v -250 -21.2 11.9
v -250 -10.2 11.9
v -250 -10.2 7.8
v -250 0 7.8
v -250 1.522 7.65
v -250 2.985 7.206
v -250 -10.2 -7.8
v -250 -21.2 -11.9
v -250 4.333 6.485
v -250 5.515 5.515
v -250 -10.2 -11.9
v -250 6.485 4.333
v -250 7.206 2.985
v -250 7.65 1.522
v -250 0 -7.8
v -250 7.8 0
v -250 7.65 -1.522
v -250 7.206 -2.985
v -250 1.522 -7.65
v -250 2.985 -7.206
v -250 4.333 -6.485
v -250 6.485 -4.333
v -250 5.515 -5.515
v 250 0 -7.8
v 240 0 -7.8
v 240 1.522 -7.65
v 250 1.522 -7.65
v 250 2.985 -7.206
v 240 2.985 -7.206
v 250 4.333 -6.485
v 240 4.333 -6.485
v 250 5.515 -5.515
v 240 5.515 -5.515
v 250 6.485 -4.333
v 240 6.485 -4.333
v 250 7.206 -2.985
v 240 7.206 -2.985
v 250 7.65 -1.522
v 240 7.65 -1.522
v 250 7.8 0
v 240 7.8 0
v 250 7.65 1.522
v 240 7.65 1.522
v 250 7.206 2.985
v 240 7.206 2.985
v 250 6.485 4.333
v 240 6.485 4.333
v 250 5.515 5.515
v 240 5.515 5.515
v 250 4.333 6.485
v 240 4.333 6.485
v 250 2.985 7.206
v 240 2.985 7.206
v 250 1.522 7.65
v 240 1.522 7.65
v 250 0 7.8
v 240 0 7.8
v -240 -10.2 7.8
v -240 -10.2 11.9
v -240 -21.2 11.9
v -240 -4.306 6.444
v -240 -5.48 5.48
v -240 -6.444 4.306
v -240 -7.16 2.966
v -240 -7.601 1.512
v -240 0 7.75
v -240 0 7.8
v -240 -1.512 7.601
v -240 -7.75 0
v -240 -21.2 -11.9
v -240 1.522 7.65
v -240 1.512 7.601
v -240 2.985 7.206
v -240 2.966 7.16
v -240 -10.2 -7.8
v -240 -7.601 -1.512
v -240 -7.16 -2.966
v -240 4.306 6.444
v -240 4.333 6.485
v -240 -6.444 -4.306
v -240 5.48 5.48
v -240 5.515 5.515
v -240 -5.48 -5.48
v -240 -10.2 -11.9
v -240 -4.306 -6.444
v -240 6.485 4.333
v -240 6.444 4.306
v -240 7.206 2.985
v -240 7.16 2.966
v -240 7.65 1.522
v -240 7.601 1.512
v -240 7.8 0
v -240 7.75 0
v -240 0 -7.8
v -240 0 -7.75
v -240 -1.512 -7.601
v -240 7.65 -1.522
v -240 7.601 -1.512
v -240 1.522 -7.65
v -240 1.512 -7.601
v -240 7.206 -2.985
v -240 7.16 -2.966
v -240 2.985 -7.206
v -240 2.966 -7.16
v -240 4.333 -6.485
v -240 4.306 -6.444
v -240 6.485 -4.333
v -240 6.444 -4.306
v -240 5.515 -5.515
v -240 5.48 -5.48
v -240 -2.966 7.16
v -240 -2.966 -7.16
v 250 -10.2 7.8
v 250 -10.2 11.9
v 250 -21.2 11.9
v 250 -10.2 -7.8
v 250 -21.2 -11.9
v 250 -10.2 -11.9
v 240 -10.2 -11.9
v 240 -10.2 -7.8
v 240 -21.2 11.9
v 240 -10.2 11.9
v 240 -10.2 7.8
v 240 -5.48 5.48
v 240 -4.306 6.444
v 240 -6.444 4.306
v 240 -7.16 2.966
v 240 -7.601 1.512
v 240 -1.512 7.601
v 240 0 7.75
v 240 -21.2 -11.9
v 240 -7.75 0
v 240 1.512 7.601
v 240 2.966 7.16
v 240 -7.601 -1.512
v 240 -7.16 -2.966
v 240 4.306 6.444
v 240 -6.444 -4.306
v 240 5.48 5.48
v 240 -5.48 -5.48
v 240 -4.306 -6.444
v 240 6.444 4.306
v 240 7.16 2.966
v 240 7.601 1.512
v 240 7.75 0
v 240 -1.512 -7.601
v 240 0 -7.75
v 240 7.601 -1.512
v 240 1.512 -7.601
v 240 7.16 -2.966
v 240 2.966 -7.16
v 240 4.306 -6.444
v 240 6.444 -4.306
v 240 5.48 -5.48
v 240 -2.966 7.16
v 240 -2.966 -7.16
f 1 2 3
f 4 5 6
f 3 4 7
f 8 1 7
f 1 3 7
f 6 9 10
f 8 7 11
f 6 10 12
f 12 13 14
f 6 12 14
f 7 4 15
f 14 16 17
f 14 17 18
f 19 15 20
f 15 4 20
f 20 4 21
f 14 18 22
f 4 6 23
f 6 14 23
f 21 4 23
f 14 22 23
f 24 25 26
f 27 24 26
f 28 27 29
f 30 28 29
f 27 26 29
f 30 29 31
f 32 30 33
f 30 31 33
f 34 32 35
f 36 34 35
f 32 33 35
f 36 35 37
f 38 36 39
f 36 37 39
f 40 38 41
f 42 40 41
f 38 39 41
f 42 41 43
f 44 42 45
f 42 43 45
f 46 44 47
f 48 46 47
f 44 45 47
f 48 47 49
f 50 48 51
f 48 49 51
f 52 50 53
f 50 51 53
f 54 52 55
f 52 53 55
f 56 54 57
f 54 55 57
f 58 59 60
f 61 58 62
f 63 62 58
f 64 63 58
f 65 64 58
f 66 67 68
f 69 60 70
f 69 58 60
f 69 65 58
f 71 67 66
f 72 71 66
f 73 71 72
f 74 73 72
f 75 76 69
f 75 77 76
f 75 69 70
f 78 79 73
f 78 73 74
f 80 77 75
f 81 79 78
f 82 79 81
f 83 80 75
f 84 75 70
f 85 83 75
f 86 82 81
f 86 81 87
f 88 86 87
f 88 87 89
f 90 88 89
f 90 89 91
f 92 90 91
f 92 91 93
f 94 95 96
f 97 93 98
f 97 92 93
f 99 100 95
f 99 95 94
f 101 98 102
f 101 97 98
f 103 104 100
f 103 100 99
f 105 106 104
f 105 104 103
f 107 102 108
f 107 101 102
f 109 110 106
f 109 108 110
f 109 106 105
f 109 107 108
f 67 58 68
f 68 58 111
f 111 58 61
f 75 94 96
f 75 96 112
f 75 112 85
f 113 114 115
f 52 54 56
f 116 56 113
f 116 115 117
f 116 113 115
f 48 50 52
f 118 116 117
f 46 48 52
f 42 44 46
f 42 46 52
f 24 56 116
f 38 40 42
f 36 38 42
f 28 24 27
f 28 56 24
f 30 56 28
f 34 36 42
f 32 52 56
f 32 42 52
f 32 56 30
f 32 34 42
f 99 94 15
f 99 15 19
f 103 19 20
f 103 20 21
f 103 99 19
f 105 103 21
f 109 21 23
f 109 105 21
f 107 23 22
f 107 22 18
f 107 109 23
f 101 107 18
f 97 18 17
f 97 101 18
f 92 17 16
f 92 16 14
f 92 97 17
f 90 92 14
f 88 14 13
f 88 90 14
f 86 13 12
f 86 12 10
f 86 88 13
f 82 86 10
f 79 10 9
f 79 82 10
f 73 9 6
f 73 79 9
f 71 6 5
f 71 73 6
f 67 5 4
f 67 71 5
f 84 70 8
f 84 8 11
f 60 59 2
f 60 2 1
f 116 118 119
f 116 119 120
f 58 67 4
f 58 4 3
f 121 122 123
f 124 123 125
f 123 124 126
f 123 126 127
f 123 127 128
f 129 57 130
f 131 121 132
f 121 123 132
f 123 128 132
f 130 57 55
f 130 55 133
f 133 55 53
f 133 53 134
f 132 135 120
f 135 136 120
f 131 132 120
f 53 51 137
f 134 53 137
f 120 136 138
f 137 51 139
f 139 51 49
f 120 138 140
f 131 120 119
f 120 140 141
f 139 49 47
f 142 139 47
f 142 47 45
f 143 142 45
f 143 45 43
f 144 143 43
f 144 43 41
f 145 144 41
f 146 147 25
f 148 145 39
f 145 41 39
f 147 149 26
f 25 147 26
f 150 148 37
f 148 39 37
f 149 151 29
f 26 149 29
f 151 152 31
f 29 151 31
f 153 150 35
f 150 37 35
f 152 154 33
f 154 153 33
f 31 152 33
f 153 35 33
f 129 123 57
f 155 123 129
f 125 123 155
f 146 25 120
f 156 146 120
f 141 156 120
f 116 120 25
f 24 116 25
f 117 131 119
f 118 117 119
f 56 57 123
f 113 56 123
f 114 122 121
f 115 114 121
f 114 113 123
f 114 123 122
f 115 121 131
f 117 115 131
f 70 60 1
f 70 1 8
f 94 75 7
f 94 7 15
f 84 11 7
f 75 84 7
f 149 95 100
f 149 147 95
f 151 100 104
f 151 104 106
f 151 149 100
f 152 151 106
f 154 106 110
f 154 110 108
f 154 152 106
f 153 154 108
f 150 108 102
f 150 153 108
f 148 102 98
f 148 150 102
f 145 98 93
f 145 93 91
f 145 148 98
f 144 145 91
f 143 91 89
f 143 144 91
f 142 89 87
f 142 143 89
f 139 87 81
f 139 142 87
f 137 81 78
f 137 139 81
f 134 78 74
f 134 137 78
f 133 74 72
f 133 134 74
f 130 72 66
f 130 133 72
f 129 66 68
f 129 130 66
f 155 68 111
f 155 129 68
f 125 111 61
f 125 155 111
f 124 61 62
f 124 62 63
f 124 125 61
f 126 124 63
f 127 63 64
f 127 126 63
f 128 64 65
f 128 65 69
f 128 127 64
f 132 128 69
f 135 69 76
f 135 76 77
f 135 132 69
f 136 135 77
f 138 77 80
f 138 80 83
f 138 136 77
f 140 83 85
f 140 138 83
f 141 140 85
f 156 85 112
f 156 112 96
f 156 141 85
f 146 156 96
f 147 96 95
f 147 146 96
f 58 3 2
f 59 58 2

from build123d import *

# Parameters (mm, degrees)
SKETCH1_R           = 7.75
BOSS_EXTRUDE1_DEPTH = 240
BOSS_EXTRUDE2_DEPTH = 10


with BuildPart() as part:
    # Sketch1 → Boss-Extrude1 (new body)
    with BuildSketch(Plane(origin=(0, 0, 0), x_dir=(0, 0, -1), z_dir=(1, 0, 0))):
        Circle(SKETCH1_R)
    boss_extrude1 = extrude(amount=BOSS_EXTRUDE1_DEPTH)

    # Sketch2 → Boss-Extrude2 (add)
    with BuildSketch(Plane(origin=(240, 0, 0), x_dir=(0, 0, -1), z_dir=(1, 0, 0))):
        with BuildLine():
            Line((-7.8, 0), (-7.8, -10.2))
            Line((-7.8, -10.2), (-11.9, -10.2))
            Line((-11.9, -10.2), (-11.9, -21.2))
            Line((-11.9, -21.2), (11.9, -21.2))
            Line((11.9, -21.2), (11.9, -10.2))
            Line((11.9, -10.2), (7.8, -10.2))
            Line((7.8, -10.2), (7.8, 0))
            ThreePointArc((7.8, 0), (0, 7.8), (-7.8, 0))
        make_face()
    boss_extrude2 = extrude(amount=BOSS_EXTRUDE2_DEPTH)

    # Mirror1: Boss-Extrude1, Boss-Extrude2 across plane
    add(boss_extrude1.mirror(Plane.ZY))
    add(boss_extrude2.mirror(Plane.ZY))


solid = part.part
